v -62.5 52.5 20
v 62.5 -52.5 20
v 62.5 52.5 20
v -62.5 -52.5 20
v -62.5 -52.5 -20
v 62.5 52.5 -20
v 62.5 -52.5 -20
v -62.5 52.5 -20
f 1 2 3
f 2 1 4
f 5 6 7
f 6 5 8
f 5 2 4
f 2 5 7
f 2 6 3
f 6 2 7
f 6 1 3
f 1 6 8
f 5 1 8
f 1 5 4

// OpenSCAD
// ========================================
// a 125 x 105 x 40 mm box
// NeuroCAD canonical IR; dimensions are millimetres
// ========================================
$fn = 48;

cube(size=[125, 105, 40], center=true);
